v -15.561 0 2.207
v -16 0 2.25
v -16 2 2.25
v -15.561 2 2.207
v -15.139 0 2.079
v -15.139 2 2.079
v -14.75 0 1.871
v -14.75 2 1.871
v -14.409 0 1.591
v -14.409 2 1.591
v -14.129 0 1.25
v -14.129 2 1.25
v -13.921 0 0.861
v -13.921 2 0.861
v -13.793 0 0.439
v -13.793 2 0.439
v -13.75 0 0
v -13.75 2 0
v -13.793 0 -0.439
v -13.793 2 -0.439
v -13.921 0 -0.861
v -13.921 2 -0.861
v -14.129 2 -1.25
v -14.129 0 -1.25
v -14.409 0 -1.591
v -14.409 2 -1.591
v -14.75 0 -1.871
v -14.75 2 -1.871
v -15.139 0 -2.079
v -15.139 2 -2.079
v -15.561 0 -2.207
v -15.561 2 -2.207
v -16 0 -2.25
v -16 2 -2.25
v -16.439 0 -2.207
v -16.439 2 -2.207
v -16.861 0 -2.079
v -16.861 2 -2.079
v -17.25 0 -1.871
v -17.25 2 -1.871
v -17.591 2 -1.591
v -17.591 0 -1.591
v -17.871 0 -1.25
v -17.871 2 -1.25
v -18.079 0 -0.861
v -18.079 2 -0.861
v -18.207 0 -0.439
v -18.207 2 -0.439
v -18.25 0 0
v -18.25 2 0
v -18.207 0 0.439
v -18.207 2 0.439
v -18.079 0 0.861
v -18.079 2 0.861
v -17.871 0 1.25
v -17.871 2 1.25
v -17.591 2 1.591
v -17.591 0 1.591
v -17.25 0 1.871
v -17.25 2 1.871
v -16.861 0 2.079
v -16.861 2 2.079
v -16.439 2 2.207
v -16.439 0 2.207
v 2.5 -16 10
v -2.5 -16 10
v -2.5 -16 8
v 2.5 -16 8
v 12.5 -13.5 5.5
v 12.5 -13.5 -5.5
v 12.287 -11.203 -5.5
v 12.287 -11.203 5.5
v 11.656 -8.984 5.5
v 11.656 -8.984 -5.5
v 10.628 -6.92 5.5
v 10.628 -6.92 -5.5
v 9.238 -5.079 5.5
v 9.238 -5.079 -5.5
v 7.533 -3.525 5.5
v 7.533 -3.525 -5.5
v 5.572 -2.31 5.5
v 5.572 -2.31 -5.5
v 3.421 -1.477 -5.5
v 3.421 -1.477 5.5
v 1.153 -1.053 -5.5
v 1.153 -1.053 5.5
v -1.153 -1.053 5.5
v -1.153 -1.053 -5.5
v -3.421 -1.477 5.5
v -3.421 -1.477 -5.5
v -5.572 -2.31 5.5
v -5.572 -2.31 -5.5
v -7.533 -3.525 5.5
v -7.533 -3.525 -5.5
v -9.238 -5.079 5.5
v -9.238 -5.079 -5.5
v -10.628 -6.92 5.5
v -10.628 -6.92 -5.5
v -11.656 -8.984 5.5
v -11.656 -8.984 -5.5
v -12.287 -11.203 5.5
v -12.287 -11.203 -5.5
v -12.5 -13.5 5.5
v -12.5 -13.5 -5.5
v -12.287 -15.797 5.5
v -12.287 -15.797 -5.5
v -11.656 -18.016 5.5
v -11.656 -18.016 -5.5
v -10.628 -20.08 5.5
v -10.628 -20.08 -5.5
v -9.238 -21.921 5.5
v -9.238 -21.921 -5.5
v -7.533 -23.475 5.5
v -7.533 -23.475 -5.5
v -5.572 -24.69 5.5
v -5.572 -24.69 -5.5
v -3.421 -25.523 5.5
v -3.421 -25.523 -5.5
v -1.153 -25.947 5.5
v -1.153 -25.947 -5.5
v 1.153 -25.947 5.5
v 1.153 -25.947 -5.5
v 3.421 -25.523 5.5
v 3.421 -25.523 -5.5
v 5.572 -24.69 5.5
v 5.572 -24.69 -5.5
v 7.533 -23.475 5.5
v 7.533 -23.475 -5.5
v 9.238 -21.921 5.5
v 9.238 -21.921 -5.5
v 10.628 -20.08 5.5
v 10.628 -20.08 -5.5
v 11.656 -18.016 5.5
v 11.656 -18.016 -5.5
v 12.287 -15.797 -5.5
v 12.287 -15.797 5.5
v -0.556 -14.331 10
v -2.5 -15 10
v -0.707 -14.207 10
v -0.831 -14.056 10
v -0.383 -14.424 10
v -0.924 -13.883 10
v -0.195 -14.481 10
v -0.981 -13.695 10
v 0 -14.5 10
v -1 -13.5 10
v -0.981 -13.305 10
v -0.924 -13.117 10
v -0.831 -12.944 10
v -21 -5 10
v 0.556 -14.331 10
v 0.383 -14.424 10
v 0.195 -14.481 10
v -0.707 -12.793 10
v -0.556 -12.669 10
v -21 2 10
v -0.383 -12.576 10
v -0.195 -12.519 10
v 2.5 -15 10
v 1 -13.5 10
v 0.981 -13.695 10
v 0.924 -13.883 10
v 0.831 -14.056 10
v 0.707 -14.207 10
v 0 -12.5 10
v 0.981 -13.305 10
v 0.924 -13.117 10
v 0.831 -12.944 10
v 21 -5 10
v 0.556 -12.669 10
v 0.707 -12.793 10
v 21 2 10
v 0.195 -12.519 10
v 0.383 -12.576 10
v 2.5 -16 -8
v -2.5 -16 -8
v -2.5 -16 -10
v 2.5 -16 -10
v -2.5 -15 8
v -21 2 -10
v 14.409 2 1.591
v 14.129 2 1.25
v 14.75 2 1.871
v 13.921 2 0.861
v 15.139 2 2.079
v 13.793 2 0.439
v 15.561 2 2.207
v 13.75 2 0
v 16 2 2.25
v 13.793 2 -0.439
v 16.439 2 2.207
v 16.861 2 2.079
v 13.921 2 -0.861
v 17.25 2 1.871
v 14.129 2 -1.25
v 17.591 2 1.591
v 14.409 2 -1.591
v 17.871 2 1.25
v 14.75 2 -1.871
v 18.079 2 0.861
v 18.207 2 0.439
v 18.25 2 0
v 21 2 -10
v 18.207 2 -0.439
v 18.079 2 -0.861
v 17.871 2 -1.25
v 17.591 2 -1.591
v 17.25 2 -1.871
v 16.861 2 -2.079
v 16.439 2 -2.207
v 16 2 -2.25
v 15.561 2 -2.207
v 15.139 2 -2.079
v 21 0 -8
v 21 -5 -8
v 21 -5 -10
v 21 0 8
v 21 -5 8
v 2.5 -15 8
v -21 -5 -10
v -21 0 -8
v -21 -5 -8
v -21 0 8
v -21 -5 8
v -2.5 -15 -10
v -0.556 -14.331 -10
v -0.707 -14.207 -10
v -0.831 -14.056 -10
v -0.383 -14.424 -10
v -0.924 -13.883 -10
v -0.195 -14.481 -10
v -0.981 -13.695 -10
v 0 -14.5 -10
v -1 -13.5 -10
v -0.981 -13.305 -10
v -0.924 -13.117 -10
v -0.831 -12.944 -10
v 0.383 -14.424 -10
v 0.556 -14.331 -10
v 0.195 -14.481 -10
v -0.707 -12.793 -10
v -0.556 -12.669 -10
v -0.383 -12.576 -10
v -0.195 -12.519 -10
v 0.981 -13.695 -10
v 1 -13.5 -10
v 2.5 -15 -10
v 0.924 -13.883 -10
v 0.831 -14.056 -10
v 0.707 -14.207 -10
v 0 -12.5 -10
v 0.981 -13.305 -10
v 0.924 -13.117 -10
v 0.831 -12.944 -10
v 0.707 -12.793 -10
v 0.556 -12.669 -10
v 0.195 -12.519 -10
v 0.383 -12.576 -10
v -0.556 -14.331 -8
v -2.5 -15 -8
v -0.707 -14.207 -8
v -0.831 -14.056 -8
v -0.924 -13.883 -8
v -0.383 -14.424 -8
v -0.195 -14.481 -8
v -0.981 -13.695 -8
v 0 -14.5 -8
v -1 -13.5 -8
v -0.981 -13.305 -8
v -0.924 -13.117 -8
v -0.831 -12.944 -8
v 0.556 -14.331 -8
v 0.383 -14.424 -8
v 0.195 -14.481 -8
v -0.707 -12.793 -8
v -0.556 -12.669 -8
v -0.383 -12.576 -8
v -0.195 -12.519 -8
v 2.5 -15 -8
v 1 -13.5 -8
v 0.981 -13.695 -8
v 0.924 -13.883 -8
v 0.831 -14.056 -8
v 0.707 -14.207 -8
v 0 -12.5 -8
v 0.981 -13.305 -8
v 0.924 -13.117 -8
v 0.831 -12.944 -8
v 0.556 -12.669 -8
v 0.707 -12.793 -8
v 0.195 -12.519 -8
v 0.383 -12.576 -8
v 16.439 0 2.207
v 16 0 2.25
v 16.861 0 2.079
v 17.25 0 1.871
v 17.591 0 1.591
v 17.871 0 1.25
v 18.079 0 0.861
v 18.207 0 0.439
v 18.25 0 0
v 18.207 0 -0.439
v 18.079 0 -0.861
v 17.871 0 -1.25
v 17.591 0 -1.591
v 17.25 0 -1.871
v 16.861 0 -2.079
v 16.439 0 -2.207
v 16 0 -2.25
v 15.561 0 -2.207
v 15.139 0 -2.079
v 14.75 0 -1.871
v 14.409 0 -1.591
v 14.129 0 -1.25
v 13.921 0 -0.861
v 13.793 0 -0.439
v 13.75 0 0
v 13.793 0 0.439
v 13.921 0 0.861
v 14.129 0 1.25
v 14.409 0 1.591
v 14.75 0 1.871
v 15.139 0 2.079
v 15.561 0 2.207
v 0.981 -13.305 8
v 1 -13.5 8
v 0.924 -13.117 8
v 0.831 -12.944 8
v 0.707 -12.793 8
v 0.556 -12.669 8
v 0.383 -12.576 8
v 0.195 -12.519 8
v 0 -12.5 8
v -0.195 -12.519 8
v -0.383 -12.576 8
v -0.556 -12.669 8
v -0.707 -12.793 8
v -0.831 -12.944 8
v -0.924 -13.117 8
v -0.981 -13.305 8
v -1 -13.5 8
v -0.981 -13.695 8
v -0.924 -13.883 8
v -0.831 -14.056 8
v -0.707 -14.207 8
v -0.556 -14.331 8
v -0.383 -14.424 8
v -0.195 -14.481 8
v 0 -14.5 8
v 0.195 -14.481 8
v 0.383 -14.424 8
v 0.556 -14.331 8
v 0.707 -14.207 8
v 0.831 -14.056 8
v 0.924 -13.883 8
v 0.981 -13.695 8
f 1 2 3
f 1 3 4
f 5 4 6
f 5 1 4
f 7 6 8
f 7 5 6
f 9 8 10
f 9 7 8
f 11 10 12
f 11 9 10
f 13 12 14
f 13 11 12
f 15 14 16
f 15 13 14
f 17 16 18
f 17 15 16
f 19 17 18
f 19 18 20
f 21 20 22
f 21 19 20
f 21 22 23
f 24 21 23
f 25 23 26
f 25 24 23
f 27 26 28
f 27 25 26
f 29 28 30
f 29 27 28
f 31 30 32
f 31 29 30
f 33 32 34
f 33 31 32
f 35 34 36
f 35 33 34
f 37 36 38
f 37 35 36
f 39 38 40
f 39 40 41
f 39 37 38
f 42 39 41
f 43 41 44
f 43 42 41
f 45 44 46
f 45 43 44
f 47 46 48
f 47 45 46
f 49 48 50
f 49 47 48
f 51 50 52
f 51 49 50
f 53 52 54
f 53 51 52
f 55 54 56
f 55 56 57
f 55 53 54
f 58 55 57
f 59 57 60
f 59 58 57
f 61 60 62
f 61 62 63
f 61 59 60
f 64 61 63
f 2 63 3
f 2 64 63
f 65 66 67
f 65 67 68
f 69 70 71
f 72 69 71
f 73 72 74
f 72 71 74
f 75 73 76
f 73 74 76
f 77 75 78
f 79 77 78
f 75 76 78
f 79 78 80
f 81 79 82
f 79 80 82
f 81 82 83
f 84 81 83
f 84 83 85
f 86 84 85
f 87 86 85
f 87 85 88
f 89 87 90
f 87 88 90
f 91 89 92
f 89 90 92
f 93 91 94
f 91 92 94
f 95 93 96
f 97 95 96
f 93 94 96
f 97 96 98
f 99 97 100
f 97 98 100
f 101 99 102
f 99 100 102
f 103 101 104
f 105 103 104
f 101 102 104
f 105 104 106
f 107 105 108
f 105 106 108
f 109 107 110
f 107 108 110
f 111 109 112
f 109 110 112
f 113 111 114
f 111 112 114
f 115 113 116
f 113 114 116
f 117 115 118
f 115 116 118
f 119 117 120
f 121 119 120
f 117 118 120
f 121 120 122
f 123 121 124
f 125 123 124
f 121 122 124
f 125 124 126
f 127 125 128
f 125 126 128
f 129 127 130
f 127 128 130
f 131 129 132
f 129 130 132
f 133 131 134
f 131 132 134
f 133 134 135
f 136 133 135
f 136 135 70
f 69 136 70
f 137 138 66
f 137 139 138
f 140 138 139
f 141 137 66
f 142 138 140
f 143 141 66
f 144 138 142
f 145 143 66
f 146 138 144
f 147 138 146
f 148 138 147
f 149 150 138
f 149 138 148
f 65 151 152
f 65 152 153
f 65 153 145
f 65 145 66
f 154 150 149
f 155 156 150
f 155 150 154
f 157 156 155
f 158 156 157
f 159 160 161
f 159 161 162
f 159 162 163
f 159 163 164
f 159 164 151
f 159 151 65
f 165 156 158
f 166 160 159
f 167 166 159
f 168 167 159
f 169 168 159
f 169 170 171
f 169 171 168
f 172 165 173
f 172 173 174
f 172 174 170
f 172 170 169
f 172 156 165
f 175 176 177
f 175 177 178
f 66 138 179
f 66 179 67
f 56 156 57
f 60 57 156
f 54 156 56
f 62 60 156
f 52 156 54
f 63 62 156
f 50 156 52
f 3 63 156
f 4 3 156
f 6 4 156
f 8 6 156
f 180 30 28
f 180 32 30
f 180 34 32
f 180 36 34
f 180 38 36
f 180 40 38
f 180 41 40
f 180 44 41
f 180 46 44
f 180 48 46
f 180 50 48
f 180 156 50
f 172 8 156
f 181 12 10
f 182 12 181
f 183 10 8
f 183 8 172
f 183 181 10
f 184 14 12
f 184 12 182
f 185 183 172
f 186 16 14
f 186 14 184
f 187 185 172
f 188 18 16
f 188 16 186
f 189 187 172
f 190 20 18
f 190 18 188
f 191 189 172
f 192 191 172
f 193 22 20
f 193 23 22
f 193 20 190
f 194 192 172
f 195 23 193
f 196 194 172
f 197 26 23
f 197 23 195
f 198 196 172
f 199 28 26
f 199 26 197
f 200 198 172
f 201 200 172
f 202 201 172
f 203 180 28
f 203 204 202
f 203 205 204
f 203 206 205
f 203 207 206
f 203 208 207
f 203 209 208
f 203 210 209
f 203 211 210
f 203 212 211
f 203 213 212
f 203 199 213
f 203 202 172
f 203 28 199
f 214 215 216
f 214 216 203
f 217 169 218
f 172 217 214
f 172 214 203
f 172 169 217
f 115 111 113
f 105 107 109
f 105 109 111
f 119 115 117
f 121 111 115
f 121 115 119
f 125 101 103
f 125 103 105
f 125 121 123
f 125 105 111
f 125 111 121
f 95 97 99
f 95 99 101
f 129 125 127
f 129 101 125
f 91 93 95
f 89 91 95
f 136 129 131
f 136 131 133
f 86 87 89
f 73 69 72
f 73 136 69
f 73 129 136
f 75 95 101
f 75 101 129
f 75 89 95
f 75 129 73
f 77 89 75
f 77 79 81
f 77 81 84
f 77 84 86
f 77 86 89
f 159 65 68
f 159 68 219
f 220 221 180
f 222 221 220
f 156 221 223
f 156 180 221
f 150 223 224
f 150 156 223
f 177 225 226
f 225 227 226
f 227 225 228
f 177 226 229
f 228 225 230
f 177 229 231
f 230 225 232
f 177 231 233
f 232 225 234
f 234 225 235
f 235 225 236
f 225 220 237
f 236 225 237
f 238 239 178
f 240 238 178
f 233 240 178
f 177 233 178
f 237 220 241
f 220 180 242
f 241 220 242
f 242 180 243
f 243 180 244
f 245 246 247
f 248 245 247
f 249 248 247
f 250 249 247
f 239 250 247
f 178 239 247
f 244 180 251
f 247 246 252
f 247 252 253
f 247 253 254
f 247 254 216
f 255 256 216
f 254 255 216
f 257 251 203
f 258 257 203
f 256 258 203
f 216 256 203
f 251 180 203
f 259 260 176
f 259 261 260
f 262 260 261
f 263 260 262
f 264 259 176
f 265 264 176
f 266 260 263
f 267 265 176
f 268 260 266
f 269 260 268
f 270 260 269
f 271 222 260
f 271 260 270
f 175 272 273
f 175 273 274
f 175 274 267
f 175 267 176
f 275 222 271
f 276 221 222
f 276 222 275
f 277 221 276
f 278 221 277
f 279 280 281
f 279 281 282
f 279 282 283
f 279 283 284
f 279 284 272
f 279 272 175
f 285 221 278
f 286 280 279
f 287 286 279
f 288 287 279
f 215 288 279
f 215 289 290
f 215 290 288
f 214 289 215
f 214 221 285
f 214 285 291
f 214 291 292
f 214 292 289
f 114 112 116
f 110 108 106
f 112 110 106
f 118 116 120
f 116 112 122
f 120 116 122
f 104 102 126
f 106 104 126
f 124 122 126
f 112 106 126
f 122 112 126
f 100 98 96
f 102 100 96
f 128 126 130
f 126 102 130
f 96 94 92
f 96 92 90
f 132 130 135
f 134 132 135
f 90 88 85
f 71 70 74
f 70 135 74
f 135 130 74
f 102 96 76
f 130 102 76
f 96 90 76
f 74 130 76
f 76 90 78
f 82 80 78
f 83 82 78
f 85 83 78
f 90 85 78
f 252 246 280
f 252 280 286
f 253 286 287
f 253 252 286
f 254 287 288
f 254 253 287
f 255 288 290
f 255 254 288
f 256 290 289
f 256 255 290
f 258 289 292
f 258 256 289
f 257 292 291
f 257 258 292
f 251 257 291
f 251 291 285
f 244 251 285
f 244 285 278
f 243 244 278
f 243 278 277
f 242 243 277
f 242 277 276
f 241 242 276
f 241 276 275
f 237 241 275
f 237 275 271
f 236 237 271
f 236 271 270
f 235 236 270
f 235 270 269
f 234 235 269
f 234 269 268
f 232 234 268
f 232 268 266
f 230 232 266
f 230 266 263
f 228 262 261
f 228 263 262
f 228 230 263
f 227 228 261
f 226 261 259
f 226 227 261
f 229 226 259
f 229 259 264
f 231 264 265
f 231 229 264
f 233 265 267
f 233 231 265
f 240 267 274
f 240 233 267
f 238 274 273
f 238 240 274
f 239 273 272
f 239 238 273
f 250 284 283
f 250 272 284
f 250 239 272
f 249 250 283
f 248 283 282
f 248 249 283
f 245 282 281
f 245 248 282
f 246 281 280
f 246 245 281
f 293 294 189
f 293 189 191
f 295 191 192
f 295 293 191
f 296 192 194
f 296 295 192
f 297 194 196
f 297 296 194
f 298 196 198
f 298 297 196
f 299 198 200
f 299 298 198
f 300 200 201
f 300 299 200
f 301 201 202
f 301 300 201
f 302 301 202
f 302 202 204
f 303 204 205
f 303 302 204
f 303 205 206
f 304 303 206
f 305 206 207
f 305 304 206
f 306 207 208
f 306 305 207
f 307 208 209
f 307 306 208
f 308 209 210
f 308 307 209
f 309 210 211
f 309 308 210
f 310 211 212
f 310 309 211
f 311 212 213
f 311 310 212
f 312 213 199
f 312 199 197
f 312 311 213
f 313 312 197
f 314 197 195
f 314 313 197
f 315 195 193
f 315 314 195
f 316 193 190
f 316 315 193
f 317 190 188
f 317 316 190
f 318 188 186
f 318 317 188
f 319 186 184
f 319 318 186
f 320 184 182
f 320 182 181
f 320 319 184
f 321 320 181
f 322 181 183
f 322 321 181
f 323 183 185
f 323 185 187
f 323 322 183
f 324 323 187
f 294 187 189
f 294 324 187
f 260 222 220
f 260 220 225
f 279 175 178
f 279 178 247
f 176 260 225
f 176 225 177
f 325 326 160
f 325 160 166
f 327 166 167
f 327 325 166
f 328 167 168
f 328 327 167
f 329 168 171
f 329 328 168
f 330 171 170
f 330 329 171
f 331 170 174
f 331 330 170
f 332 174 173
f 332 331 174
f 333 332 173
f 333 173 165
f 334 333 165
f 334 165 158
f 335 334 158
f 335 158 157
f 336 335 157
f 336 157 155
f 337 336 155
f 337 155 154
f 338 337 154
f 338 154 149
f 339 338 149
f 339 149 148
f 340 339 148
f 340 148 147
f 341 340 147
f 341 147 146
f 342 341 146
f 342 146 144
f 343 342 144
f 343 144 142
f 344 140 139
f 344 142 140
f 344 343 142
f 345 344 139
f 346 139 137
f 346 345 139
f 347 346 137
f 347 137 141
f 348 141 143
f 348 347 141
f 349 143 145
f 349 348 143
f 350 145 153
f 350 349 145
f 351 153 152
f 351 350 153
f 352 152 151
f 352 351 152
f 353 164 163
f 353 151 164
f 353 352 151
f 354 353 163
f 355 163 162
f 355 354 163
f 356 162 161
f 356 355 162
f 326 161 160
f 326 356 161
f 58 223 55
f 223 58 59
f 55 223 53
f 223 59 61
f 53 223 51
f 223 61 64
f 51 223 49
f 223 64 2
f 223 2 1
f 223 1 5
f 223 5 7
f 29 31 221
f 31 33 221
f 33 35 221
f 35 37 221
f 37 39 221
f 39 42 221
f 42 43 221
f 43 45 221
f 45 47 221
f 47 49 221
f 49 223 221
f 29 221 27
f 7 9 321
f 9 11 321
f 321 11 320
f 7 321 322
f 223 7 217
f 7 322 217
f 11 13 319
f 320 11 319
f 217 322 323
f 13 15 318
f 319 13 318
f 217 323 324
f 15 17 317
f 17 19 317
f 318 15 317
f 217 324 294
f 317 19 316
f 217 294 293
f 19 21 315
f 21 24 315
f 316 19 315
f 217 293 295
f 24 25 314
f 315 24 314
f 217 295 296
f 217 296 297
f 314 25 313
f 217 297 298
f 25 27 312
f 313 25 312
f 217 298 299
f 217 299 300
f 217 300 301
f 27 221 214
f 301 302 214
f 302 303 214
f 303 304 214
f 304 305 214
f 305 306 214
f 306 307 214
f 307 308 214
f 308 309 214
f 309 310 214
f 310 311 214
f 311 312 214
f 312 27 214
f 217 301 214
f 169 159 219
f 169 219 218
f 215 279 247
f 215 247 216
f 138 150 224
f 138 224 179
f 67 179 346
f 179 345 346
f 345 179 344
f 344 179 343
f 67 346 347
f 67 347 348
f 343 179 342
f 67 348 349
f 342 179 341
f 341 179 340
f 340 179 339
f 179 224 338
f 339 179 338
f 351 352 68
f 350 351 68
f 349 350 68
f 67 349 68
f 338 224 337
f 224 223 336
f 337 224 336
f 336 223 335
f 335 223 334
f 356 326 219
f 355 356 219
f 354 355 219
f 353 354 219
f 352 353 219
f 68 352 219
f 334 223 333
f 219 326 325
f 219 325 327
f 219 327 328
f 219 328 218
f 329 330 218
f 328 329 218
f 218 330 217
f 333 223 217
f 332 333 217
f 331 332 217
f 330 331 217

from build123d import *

# Parameters (mm, degrees)
SKETCH_1_W               = 42
SKETCH_1_H               = 20
SKETCH_1_R               = 2.25
EXTRUDE_1_DEPTH          = 2
EXTRUDE_START            = -5.5
SKETCH_2_R               = 12.5
EXTRUDE_2_DEPTH          = 11
EXTRUDE_3_DEPTH          = 2
PATTERN_LINEAR_1_COUNT   = 2
PATTERN_LINEAR_1_PITCH   = 18
CUT_EXTRUDE_1_DEPTH      = 38.960505792
CUT_EXTRUDE_1_DEPTH_BACK = 38.960505792
SKETCH_4_R               = 1


with BuildPart() as part:
    # Эскиз1 → Бобышка-Вытянуть1 (new body)
    with BuildSketch(Plane(origin=(0, 0, 0), x_dir=(1, 0, 0), z_dir=(0, 1, 0))):
        Rectangle(SKETCH_1_W, SKETCH_1_H)
        with Locations(Location((-16, 0, 0), (0, 0, 270))):
            Circle(SKETCH_1_R, mode=Mode.SUBTRACT)
        with Locations(Location((16, 0, 0), (0, 0, 270))):
            Circle(SKETCH_1_R, mode=Mode.SUBTRACT)
    extrude(amount=EXTRUDE_1_DEPTH)

    # Эскиз3 → Бобышка-Вытянуть3 (add)
    with BuildSketch(Plane.XY.offset(10)):
        Polygon((-21, -5), (-2.5, -15), (-2.5, -16), (2.5, -16), (2.5, -15), (21, -5), (21, 0), (-21, 0), align=None)
    extrude_3 = extrude(amount=-EXTRUDE_3_DEPTH)

    # Линейный массив1: Бобышка-Вытянуть3 ×2
    with Locations(*[(0, 0, -i * PATTERN_LINEAR_1_PITCH) for i in range(1, PATTERN_LINEAR_1_COUNT)]):
        add(extrude_3)

    # Эскиз4 → Вырез-Вытянуть1 (cut, two sides: drawn at the far end of the back side and taken through both)
    with BuildSketch(Plane.XY.offset(-8).offset(-CUT_EXTRUDE_1_DEPTH_BACK)):
        with Locations((0, -13.5)):
            Circle(SKETCH_4_R)
    extrude(amount=CUT_EXTRUDE_1_DEPTH + CUT_EXTRUDE_1_DEPTH_BACK, mode=Mode.SUBTRACT)


with BuildPart() as body_2:
    # Эскиз2 → Бобышка-Вытянуть2 (new body)
    with BuildSketch(Plane.XY.offset(EXTRUDE_START)):
        with Locations((0, -13.5)):
            Circle(SKETCH_2_R)
    extrude(amount=EXTRUDE_2_DEPTH)


solid = Compound([part.part, body_2.part])
